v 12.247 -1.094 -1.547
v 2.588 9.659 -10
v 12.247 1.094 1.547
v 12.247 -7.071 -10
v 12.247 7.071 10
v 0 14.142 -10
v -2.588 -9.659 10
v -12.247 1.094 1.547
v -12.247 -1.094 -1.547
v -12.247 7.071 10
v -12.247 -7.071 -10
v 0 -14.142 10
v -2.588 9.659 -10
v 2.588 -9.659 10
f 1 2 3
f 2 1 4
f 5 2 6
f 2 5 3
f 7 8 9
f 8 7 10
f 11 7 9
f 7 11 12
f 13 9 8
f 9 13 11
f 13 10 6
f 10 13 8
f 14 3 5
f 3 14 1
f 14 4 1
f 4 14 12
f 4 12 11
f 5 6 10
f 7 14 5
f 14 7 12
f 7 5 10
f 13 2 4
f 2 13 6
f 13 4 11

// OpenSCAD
// Note that it generates a 20 vertex octo in openscad

module box(size) {
    cube([2*size, 2*size, size], center = true); 
}

module octahedron(size) {
      dihedral = 109.47122;
      n = 3;
      intersection(){
            box(size);
            intersection_for(i=[1:n])  { 
                rotate([dihedral, 0, 360 /n * i])  box(size); 
           }
      }
}

octahedron(20);
